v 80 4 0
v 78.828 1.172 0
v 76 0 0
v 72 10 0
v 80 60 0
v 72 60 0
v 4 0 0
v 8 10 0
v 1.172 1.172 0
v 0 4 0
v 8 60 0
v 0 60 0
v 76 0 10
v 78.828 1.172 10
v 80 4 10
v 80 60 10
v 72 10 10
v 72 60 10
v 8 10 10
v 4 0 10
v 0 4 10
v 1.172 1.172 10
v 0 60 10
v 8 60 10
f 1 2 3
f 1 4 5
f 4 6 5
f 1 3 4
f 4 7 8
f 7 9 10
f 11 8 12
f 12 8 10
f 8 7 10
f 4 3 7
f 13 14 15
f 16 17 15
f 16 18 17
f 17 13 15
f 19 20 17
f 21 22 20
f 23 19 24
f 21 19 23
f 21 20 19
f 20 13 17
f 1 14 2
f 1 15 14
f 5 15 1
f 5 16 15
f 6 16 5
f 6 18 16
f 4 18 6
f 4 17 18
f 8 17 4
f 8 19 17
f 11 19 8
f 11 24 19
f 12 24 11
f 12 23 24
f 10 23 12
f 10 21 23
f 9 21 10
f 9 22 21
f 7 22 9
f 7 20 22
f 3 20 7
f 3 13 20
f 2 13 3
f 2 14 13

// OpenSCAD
$fn = 32;

// ----------------------------------------------------------------------
// Heat sink frame: 80 x 60 mm frame, 8 mm walls
// ----------------------------------------------------------------------

// --- parameters (mm) ---
profile_height = 10;      // extrusion height
profile_points = 12;      // points of the closed outline

profile = [[0, 4], [1.172, 1.172], [4, 0], [76, 0], [78.828, 1.172], [80, 4], [80, 60], [72, 60], [72, 10], [8, 10], [8, 60], [0, 60]];  // single closed polygon, 12 points, counter clockwise

// --- the one profile operation ---
linear_extrude(height = profile_height) polygon(points = profile);
